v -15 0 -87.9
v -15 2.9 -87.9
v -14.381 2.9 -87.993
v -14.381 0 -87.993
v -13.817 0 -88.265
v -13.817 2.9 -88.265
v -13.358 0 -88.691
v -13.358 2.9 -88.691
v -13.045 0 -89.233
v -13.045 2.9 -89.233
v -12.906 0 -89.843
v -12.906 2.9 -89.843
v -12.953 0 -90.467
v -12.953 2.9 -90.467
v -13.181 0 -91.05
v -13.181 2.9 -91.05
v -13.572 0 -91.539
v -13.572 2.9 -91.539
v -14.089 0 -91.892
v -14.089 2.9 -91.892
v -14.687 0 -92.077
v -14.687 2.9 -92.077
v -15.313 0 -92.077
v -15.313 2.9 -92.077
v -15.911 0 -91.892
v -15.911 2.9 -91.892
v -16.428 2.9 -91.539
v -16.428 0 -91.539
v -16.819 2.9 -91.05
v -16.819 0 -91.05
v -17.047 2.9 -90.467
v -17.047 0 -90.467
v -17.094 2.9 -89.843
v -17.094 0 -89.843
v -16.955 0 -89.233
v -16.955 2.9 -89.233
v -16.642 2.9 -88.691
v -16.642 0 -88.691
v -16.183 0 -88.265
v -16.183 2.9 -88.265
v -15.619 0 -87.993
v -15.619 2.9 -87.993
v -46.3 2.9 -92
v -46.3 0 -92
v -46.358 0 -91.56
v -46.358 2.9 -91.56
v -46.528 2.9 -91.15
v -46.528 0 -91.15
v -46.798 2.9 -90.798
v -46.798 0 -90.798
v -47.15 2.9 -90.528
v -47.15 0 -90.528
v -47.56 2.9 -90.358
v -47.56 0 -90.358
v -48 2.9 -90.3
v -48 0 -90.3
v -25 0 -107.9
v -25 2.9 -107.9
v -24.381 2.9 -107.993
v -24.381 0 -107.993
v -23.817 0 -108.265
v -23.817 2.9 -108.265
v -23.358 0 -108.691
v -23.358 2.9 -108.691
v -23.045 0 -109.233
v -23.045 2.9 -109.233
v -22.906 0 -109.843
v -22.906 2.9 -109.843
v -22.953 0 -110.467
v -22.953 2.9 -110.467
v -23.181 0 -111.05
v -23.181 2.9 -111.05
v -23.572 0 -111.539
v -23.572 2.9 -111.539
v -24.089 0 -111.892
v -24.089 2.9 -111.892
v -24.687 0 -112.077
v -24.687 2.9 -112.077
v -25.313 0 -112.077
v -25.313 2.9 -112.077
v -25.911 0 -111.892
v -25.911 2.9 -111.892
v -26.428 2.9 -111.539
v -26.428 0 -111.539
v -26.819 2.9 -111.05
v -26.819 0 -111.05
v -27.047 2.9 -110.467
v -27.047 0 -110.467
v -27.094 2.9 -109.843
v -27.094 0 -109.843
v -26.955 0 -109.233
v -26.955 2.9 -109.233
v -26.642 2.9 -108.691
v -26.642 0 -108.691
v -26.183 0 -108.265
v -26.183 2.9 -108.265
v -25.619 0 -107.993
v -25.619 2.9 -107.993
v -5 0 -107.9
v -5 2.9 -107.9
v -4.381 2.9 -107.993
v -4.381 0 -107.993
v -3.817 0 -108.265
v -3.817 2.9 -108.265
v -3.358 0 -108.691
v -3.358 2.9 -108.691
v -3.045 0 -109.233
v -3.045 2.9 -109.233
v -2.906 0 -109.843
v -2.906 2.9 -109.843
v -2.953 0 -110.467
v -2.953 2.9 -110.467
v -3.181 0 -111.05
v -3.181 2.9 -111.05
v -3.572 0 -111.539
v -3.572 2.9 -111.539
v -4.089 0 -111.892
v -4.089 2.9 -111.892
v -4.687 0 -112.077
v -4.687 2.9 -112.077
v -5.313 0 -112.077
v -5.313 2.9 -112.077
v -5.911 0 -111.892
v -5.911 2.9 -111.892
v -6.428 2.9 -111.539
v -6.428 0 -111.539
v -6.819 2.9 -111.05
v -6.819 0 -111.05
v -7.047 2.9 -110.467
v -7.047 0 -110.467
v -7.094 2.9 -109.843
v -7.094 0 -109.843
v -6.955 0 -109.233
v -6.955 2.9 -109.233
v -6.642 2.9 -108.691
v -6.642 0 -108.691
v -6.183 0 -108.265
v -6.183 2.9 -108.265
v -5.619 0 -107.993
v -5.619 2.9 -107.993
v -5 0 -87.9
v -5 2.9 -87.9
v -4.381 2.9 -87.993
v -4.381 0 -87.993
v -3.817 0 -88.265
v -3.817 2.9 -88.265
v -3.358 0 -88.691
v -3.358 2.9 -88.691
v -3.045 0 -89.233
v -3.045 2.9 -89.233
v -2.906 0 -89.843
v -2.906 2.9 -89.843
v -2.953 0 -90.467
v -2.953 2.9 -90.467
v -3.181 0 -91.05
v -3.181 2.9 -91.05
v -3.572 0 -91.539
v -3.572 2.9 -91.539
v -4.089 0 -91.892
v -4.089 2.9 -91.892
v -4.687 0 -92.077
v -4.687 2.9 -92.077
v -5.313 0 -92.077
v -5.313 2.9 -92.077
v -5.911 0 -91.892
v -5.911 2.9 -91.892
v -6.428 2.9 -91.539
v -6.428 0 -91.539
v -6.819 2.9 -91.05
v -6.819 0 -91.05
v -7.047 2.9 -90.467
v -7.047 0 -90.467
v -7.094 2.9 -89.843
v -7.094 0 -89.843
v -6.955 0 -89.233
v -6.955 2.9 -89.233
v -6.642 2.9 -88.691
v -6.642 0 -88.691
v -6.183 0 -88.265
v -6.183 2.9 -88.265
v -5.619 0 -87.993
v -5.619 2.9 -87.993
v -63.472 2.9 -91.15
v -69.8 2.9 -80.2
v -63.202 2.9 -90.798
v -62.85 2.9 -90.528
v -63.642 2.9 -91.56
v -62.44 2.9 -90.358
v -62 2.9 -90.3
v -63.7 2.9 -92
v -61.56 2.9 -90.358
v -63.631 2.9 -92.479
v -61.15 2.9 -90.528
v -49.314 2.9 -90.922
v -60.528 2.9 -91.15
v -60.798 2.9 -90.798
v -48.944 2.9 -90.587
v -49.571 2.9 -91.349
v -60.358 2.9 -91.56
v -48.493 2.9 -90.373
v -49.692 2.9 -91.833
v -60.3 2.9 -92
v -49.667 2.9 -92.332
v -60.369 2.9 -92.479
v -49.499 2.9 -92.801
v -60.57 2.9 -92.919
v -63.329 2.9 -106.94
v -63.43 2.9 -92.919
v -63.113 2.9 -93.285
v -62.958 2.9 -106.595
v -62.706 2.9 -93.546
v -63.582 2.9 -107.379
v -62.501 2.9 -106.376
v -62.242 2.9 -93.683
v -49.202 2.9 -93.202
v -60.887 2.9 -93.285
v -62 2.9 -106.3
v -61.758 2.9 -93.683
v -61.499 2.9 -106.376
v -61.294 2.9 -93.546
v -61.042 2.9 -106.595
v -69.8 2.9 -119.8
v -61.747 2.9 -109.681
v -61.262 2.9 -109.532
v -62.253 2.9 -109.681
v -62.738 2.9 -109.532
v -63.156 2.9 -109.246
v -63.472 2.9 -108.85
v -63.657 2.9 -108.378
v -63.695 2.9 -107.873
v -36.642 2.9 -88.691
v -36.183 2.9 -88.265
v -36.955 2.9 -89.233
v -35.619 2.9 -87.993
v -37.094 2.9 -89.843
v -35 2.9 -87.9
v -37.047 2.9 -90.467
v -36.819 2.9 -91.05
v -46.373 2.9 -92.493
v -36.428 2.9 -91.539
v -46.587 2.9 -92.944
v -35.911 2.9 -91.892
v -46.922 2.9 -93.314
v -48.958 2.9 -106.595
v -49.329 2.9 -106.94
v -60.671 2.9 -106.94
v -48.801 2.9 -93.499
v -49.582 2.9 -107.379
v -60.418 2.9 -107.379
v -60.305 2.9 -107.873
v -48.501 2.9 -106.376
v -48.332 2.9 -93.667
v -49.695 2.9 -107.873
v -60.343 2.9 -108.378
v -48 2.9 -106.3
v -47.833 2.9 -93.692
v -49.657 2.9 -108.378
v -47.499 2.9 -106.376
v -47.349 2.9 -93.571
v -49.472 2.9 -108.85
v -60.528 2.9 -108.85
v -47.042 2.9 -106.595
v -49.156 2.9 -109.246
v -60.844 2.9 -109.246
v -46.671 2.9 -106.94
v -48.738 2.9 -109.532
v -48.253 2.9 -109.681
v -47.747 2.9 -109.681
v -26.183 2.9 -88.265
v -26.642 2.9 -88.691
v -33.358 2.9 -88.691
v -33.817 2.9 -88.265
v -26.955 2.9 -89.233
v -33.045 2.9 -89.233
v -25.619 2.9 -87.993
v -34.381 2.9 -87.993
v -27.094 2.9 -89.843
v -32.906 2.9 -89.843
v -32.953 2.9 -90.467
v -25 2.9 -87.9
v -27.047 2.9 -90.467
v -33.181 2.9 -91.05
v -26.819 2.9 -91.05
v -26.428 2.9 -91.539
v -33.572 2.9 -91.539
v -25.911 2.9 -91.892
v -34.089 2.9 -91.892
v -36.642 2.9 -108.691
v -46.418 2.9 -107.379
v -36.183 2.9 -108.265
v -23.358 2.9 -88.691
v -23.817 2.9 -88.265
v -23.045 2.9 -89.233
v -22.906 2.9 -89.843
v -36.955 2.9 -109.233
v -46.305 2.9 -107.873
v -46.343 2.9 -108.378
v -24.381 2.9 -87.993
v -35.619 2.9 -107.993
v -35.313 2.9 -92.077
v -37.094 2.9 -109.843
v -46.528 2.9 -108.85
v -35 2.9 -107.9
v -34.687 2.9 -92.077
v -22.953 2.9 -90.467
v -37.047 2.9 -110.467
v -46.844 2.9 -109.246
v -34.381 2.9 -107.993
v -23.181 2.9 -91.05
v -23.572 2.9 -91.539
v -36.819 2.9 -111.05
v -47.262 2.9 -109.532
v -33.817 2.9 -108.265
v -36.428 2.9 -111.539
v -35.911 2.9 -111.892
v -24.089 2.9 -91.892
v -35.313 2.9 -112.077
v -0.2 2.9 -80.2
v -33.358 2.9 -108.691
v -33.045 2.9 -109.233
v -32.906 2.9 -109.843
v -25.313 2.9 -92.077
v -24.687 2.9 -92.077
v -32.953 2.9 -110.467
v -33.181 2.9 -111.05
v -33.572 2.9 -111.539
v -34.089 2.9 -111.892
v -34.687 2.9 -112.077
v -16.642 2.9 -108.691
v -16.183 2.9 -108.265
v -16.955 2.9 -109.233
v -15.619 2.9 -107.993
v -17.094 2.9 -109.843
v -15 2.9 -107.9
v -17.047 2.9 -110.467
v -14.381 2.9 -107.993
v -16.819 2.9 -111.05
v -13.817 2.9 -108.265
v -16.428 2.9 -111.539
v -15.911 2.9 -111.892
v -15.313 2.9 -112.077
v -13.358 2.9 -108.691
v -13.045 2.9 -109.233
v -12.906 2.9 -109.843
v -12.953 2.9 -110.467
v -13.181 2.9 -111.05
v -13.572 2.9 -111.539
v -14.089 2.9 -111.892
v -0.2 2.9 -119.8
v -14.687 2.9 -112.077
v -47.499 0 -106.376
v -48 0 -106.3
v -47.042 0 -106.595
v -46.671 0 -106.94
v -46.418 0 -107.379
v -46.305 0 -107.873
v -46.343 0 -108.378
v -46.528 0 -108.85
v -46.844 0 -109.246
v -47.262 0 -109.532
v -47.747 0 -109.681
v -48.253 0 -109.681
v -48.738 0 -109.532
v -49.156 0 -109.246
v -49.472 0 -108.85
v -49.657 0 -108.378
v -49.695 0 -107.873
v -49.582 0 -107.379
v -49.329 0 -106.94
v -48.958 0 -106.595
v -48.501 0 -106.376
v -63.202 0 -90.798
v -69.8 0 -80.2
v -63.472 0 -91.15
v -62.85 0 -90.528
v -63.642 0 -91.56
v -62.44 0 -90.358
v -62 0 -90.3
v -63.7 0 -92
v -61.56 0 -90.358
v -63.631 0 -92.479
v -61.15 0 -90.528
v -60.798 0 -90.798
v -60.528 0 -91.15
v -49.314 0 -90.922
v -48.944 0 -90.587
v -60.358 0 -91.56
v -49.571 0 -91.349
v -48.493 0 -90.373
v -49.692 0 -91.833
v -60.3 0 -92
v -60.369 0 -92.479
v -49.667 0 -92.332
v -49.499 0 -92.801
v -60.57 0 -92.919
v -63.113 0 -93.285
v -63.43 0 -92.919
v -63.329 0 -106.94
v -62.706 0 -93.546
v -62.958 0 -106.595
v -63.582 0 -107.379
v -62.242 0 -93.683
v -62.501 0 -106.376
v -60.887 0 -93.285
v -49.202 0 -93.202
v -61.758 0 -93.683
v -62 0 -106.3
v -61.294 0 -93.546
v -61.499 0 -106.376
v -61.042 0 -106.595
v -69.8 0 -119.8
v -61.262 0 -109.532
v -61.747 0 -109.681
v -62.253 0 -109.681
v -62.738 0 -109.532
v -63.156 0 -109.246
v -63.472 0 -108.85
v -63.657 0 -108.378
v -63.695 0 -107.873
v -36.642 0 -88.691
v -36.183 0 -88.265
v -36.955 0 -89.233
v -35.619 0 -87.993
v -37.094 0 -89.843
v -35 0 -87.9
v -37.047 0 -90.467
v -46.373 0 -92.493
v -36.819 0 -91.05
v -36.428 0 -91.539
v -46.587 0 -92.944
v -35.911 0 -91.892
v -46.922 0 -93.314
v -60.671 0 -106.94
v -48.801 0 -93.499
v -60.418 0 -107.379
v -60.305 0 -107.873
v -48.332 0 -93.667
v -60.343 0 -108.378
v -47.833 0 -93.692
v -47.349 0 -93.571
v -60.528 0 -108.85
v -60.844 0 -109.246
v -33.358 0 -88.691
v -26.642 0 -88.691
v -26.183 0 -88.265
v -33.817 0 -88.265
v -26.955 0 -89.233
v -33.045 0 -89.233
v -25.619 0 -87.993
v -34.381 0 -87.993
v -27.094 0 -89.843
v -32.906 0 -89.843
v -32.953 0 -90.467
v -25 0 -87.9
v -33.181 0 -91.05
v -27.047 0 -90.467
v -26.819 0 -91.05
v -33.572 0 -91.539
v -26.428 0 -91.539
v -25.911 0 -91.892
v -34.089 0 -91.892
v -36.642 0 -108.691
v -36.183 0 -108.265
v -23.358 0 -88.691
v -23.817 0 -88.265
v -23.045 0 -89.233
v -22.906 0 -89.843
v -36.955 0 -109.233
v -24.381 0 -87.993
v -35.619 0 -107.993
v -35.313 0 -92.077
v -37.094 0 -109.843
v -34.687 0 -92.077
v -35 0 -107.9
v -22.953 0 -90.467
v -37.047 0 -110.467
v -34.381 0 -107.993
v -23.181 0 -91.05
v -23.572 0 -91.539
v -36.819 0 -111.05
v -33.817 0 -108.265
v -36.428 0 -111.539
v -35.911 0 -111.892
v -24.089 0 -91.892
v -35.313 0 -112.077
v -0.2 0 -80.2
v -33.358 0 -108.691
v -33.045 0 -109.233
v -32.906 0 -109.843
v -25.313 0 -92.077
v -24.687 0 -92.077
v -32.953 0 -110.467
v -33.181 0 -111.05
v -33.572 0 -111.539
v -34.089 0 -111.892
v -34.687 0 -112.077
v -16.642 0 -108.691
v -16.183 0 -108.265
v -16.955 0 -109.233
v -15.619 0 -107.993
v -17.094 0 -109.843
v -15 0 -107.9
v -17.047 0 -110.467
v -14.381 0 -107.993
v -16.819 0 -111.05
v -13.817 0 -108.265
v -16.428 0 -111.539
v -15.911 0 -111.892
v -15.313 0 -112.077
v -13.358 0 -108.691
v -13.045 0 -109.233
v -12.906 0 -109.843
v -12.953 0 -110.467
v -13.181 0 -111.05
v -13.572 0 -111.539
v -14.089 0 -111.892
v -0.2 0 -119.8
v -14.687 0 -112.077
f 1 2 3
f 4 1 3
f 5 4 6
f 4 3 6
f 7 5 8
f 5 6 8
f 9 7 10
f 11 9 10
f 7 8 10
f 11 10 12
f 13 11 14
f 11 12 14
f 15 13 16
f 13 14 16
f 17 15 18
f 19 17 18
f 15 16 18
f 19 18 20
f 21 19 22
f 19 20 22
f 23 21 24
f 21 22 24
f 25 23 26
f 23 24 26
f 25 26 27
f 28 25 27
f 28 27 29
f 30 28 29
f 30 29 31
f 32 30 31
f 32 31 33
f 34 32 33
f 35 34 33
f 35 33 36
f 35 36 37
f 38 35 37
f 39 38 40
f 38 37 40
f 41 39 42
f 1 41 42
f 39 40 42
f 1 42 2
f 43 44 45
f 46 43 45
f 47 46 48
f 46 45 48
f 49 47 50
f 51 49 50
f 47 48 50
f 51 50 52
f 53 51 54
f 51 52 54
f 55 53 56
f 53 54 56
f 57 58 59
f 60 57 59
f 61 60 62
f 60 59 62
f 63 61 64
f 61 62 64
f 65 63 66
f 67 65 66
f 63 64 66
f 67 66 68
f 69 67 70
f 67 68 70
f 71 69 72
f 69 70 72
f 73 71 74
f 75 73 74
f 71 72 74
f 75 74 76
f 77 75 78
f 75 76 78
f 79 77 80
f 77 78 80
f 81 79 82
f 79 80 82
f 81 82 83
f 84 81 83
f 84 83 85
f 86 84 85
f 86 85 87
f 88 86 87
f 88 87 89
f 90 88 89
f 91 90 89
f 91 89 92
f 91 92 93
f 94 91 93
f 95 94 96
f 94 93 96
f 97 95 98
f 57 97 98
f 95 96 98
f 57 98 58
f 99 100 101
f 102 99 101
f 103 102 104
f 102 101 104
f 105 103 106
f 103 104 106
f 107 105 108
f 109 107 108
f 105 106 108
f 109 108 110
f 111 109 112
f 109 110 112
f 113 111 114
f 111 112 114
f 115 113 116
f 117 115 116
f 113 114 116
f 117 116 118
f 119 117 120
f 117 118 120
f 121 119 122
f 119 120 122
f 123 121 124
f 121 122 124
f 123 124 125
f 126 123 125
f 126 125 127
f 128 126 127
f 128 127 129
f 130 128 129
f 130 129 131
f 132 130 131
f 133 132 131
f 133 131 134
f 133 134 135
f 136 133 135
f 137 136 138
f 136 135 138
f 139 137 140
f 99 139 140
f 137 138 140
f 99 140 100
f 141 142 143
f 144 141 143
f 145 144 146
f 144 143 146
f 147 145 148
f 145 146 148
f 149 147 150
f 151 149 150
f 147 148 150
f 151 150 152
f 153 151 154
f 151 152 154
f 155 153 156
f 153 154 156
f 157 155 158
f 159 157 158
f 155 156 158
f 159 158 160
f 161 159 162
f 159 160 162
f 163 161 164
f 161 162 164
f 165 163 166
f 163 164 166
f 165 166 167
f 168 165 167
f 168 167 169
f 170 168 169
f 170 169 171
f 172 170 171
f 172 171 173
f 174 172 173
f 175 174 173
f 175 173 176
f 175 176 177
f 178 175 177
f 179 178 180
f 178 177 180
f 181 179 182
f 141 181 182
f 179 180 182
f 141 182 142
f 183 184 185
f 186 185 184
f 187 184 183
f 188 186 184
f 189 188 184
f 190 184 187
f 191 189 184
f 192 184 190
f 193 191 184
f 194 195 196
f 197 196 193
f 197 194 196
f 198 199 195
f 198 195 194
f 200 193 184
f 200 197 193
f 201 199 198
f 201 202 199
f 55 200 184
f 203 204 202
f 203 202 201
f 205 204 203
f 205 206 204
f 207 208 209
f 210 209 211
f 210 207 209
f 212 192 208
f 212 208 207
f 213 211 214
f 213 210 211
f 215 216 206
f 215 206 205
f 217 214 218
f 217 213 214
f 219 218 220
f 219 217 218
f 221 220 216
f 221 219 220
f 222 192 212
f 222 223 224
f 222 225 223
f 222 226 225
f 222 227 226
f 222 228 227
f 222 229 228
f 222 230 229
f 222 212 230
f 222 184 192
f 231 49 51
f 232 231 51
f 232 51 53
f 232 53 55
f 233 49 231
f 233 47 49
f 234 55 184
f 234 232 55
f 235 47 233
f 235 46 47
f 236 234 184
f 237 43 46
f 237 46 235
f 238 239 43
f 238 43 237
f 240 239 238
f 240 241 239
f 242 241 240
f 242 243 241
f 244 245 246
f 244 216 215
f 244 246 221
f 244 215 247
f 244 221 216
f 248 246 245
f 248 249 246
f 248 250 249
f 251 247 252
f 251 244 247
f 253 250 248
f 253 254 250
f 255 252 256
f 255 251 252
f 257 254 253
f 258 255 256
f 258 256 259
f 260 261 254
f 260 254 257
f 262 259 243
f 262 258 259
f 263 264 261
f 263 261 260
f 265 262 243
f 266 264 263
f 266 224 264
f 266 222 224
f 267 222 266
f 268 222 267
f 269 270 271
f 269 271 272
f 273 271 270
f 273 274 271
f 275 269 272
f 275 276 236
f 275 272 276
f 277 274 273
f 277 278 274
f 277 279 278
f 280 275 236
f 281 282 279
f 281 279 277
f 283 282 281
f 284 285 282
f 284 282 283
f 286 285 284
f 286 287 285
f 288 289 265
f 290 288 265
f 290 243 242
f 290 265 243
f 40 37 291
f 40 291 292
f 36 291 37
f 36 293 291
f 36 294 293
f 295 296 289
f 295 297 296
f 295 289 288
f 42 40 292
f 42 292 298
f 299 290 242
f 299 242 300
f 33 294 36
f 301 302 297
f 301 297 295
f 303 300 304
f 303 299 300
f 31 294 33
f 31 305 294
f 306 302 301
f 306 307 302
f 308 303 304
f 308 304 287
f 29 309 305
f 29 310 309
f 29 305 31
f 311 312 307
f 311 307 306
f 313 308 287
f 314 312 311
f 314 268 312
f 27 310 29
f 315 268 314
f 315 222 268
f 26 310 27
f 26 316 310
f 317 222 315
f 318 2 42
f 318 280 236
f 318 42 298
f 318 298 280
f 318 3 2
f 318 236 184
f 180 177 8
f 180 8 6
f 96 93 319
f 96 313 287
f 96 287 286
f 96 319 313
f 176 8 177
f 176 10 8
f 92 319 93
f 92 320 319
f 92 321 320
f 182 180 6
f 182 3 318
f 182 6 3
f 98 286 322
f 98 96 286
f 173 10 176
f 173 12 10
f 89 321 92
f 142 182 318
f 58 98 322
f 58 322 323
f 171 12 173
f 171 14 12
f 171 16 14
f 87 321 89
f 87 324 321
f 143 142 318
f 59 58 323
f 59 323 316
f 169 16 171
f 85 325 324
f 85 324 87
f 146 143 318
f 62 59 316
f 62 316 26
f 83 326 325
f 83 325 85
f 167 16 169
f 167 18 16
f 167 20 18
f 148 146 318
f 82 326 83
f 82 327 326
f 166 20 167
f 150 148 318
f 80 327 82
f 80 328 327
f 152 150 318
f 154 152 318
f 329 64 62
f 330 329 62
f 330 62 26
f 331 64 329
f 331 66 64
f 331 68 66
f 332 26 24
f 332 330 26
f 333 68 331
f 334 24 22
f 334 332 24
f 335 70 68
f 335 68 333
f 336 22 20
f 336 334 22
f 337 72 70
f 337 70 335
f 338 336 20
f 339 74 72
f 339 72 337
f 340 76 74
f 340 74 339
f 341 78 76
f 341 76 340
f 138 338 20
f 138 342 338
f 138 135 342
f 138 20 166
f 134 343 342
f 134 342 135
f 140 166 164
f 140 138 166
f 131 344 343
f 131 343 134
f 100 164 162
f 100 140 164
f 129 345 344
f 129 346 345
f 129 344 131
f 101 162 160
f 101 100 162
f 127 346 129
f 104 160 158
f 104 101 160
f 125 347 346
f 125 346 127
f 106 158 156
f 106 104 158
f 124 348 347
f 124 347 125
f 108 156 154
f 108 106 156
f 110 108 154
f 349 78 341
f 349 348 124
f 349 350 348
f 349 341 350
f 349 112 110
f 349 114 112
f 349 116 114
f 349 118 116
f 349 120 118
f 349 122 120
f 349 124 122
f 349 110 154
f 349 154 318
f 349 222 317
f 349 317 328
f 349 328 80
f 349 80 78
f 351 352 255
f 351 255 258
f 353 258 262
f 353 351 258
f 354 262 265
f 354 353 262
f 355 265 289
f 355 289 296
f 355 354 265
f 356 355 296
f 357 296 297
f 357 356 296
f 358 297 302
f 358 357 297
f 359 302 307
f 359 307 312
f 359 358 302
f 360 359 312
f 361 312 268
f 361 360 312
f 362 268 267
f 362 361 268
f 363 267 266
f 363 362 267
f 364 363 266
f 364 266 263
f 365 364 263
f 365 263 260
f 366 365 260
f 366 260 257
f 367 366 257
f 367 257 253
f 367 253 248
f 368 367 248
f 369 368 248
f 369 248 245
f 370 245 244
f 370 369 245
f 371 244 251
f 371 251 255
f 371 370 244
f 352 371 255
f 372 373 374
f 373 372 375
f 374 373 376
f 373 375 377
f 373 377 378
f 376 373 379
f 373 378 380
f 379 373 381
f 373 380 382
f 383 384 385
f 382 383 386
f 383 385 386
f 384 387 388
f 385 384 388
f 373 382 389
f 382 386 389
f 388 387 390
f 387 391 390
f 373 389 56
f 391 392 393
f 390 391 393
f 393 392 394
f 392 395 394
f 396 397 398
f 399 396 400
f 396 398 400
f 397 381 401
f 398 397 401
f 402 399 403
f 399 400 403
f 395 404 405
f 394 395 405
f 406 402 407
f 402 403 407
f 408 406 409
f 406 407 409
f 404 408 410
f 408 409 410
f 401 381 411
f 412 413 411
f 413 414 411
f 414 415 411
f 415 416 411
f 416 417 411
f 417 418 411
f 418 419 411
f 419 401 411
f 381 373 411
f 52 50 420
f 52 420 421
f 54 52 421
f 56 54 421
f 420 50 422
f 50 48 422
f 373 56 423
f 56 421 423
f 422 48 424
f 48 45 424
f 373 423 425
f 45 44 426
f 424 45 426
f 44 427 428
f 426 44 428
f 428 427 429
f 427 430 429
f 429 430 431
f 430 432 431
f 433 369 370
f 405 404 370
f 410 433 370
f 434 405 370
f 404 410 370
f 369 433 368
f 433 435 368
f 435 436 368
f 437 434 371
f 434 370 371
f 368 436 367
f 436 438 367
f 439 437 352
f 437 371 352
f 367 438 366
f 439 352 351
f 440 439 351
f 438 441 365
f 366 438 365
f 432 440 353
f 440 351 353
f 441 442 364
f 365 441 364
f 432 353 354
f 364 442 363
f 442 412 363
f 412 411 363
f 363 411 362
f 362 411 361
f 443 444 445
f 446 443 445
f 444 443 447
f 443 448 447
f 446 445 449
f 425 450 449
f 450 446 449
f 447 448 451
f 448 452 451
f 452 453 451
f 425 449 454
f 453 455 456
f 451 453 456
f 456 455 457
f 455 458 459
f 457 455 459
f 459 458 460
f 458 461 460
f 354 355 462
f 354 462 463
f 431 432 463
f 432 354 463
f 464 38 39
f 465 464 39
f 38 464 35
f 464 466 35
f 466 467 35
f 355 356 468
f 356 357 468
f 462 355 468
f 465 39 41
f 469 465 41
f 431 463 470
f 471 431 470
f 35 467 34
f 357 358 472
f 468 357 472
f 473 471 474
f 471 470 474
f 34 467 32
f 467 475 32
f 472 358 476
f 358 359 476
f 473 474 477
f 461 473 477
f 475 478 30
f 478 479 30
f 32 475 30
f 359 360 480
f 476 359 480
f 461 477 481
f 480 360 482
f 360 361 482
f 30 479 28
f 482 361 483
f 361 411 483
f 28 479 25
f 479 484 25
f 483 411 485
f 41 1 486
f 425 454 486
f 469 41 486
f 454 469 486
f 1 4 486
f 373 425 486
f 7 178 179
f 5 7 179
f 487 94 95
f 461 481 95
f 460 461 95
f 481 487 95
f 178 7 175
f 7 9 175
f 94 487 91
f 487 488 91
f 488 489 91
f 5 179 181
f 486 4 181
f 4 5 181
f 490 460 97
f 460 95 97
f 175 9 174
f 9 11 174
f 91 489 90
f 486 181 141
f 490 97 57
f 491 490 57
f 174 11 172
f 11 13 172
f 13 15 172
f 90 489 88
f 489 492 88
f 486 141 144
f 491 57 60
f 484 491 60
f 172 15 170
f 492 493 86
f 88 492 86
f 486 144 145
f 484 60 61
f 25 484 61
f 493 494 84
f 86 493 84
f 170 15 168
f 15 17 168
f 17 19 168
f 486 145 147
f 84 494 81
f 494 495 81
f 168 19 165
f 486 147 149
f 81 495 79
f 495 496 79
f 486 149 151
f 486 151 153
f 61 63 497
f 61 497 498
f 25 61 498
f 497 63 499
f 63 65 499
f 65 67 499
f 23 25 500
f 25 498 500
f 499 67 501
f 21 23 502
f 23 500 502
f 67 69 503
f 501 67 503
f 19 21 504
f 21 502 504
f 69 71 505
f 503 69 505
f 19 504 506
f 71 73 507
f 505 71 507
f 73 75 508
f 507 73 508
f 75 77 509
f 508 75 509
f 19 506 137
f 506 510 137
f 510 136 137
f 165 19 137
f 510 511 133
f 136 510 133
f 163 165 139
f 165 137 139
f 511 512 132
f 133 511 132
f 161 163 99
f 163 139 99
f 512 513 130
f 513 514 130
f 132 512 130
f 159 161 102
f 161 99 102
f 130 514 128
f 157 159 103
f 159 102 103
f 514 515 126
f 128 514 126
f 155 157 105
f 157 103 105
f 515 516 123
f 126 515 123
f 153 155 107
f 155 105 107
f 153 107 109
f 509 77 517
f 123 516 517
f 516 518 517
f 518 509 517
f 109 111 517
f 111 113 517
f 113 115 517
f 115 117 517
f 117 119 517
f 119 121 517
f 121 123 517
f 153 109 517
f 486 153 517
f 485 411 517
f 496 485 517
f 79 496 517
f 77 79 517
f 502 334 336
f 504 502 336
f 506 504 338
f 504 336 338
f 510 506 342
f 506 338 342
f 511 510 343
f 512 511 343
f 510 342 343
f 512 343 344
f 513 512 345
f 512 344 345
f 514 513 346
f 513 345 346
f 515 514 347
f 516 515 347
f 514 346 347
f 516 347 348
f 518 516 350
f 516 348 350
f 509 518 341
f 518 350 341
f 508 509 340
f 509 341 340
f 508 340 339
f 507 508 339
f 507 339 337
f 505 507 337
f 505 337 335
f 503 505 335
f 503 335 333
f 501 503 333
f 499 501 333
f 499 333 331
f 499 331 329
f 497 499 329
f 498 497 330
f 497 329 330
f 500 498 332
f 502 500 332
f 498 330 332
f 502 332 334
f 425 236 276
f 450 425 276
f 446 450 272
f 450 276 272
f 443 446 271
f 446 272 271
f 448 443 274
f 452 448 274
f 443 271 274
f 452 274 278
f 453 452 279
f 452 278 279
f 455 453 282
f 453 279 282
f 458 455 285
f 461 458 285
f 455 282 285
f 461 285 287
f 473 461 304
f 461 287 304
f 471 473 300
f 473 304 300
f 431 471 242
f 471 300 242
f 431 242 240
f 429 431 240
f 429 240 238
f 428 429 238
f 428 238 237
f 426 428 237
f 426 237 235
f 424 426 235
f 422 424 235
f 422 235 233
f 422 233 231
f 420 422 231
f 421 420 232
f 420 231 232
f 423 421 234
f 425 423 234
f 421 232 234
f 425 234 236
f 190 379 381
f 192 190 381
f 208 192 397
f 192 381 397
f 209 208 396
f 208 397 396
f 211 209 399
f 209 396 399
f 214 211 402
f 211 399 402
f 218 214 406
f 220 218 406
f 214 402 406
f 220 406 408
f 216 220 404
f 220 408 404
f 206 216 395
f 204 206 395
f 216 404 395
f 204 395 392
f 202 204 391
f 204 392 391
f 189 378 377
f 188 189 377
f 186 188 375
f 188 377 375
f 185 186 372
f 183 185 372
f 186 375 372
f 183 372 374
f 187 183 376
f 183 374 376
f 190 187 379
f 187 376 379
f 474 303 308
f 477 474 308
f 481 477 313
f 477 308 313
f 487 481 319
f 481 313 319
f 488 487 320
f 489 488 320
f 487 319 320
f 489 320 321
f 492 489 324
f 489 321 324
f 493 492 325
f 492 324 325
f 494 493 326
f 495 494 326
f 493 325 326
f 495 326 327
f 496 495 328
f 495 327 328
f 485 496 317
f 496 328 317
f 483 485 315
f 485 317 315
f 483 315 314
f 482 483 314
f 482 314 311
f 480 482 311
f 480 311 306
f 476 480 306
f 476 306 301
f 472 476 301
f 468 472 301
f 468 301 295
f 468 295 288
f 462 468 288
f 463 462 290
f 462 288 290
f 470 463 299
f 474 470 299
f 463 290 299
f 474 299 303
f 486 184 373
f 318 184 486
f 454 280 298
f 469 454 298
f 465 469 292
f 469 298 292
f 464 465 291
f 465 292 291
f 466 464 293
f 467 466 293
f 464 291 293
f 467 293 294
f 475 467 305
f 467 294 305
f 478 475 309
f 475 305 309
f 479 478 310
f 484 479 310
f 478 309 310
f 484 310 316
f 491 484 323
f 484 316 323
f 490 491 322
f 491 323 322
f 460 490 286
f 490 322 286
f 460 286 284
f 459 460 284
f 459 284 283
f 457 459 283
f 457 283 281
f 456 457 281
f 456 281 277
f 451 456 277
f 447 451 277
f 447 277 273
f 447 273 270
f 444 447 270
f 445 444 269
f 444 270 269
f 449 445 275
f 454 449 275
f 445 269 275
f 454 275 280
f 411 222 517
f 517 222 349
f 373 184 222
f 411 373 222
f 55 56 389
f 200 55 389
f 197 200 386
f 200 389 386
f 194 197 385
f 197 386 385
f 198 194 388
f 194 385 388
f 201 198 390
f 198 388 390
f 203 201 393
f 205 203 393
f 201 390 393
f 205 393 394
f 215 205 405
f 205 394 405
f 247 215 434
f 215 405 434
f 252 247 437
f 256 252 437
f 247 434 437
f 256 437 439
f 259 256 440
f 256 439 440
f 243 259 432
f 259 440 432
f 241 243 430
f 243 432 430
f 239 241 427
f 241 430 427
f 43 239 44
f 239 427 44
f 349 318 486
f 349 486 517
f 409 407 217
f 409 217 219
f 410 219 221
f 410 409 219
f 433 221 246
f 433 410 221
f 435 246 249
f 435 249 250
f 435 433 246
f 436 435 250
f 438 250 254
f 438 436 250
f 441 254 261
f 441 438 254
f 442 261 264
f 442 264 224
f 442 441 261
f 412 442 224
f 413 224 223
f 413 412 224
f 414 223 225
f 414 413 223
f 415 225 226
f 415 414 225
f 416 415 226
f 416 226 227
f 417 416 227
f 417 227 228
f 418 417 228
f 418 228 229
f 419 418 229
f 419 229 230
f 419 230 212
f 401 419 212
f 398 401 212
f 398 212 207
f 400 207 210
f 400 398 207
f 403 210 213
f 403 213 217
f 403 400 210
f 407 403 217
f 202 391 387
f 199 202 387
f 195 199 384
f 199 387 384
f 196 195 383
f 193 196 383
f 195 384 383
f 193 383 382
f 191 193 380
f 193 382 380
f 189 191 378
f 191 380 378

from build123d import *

# Parameters (mm, degrees)
SKETCH_1_R          = 1.7
SKETCH_1_W          = 5
SKETCH_1_H          = 13
SKETCH_1_H_2        = 2
EXTRUDE_3_DEPTH     = 2.9
SKETCH_3_R          = 2.1
CUT_EXTRUDE_3_DEPTH = 2.9
SKETCH_4_W          = 20
SKETCH_4_H          = 40
SKETCH_4_R          = 2.1
EXTRUDE_4_DEPTH     = 2.9
SKETCH_5_W          = 70
SKETCH_5_H          = 40
SKETCH_5_W_2        = 69.6
SKETCH_5_H_2        = 39.6
CUT_EXTRUDE_4_DEPTH = 2.9


with BuildPart() as part:
    # 草图1 → 凸台-拉伸3 (new body)
    # profile 1 of 10: a face of its own
    with BuildSketch(Plane(origin=(0, 0, 0), x_dir=(1, 0, 0), z_dir=(0, 1, 0))):
        with BuildLine():
            Line((-40, 113), (-70, 113))
            Line((-70, 113), (-70, 108))
            Line((-70, 108), (-70, 92))
            Line((-70, 92), (-63.7, 92))
            ThreePointArc((-63.7, 92), (-62, 93.7), (-60.3, 92))
            ThreePointArc((-60.3, 92), (-60.797918472, 90.797918472), (-62, 90.3))
            Line((-62, 90.3), (-62, 87))
            Line((-62, 87), (-48, 87))
            Line((-48, 87), (-48, 90.3))
            ThreePointArc((-48, 90.3), (-49.202081528, 93.202081528), (-46.3, 92))
            Line((-46.3, 92), (-40, 92))
            Line((-40, 92), (-40, 113))
        make_face()
        with Locations(Location((-62, 108, 0), (0, 0, 270))):
            Circle(SKETCH_1_R, mode=Mode.SUBTRACT)
        with Locations(Location((-48, 108, 0), (0, 0, 270))):
            Circle(SKETCH_1_R, mode=Mode.SUBTRACT)
    # profile 2 of 10: a face of its own
    with BuildSketch(Plane(origin=(0, 0, 0), x_dir=(1, 0, 0), z_dir=(0, 1, 0))):
        with BuildLine():
            Line((-70, 92), (-70, 87))
            Line((-70, 87), (-62, 87))
            Line((-62, 87), (-62, 90.3))
            ThreePointArc((-62, 90.3), (-63.202081528, 90.797918472), (-63.7, 92))
            Line((-63.7, 92), (-70, 92))
        make_face()
    # profile 3 of 10: a face of its own
    with BuildSketch(Plane(origin=(0, 0, 0), x_dir=(1, 0, 0), z_dir=(0, 1, 0))):
        with BuildLine():
            Line((-48, 90.3), (-48, 87))
            Line((-48, 87), (-40, 87))
            Line((-40, 87), (-40, 92))
            Line((-40, 92), (-46.3, 92))
            ThreePointArc((-46.3, 92), (-46.797918472, 90.797918472), (-48, 90.3))
        make_face()
    # profile 4 of 10: a face of its own
    with BuildSketch(Plane(origin=(0, 0, 0), x_dir=(1, 0, 0), z_dir=(0, 1, 0))):
        Polygon((-70, 87), (-70, 80), (-20, 80), (-20, 85), (-25, 85), (-25, 87), (-40, 87), (-48, 87), (-62, 87), align=None)
    # profile 5 of 10: a face of its own
    with BuildSketch(Plane(origin=(0, 0, 0), x_dir=(1, 0, 0), z_dir=(0, 1, 0))):
        Polygon((-25, 113), (-40, 113), (-40, 92), (-40, 87), (-25, 87), (-25, 100), align=None)
    # profile 6 of 10: a face of its own
    with BuildSketch(Plane(origin=(0, 0, 0), x_dir=(1, 0, 0), z_dir=(0, 1, 0))):
        with Locations((-22.5, 93.5)):
            Rectangle(SKETCH_1_W, SKETCH_1_H)
    # profile 7 of 10: a face of its own
    with BuildSketch(Plane(origin=(0, 0, 0), x_dir=(1, 0, 0), z_dir=(0, 1, 0))):
        with Locations((-22.5, 106.5)):
            Rectangle(SKETCH_1_W, SKETCH_1_H)
    # profile 8 of 10: a face of its own
    with BuildSketch(Plane(origin=(0, 0, 0), x_dir=(1, 0, 0), z_dir=(0, 1, 0))):
        with Locations((-22.5, 86)):
            Rectangle(SKETCH_1_W, SKETCH_1_H_2)
    # profile 9 of 10: a face of its own
    with BuildSketch(Plane(origin=(0, 0, 0), x_dir=(1, 0, 0), z_dir=(0, 1, 0))):
        Polygon((-20, 120), (-70, 120), (-70, 113), (-40, 113), (-25, 113), (-25, 115), (-20, 115), align=None)
    # profile 10 of 10: a face of its own
    with BuildSketch(Plane(origin=(0, 0, 0), x_dir=(1, 0, 0), z_dir=(0, 1, 0))):
        with Locations((-22.5, 114)):
            Rectangle(SKETCH_1_W, SKETCH_1_H_2)
    extrude(amount=EXTRUDE_3_DEPTH)

    # 草图3 → 切除-拉伸3 (cut)
    with BuildSketch(Plane(origin=(0, 2.9, 0), x_dir=(1, 0, 0), z_dir=(0, 1, 0))):
        with Locations(Location((-25, 110, 0), (0, 0, 270))):
            Circle(SKETCH_3_R)
        with Locations(Location((-25, 90, 0), (0, 0, 270))):
            Circle(SKETCH_3_R)
        with Locations(Location((-35, 90, 0), (0, 0, 270))):
            Circle(SKETCH_3_R)
        with Locations(Location((-35, 110, 0), (0, 0, 270))):
            Circle(SKETCH_3_R)
    extrude(amount=-CUT_EXTRUDE_3_DEPTH, mode=Mode.SUBTRACT)

    # 草图4 → 凸台-拉伸4 (add)
    with BuildSketch(Plane(origin=(0, 2.9, 0), x_dir=(1, 0, 0), z_dir=(0, 1, 0))):
        with Locations((-10, 100)):
            Rectangle(SKETCH_4_W, SKETCH_4_H)
        with Locations(Location((-15, 110, 0), (0, 0, 270))):
            Circle(SKETCH_4_R, mode=Mode.SUBTRACT)
        with Locations(Location((-15, 90, 0), (0, 0, 270))):
            Circle(SKETCH_4_R, mode=Mode.SUBTRACT)
        with Locations(Location((-5, 110, 0), (0, 0, 270))):
            Circle(SKETCH_4_R, mode=Mode.SUBTRACT)
        with Locations(Location((-5, 90, 0), (0, 0, 270))):
            Circle(SKETCH_4_R, mode=Mode.SUBTRACT)
    extrude(amount=-EXTRUDE_4_DEPTH)

    # 草图5 → 切除-拉伸4 (cut)
    with BuildSketch(Plane(origin=(0, 2.9, 0), x_dir=(1, 0, 0), z_dir=(0, 1, 0))):
        with Locations((-35, 100)):
            Rectangle(SKETCH_5_W, SKETCH_5_H)
        with Locations((-35, 100)):
            Rectangle(SKETCH_5_W_2, SKETCH_5_H_2, mode=Mode.SUBTRACT)
    extrude(amount=-CUT_EXTRUDE_4_DEPTH, mode=Mode.SUBTRACT)


solid = part.part
